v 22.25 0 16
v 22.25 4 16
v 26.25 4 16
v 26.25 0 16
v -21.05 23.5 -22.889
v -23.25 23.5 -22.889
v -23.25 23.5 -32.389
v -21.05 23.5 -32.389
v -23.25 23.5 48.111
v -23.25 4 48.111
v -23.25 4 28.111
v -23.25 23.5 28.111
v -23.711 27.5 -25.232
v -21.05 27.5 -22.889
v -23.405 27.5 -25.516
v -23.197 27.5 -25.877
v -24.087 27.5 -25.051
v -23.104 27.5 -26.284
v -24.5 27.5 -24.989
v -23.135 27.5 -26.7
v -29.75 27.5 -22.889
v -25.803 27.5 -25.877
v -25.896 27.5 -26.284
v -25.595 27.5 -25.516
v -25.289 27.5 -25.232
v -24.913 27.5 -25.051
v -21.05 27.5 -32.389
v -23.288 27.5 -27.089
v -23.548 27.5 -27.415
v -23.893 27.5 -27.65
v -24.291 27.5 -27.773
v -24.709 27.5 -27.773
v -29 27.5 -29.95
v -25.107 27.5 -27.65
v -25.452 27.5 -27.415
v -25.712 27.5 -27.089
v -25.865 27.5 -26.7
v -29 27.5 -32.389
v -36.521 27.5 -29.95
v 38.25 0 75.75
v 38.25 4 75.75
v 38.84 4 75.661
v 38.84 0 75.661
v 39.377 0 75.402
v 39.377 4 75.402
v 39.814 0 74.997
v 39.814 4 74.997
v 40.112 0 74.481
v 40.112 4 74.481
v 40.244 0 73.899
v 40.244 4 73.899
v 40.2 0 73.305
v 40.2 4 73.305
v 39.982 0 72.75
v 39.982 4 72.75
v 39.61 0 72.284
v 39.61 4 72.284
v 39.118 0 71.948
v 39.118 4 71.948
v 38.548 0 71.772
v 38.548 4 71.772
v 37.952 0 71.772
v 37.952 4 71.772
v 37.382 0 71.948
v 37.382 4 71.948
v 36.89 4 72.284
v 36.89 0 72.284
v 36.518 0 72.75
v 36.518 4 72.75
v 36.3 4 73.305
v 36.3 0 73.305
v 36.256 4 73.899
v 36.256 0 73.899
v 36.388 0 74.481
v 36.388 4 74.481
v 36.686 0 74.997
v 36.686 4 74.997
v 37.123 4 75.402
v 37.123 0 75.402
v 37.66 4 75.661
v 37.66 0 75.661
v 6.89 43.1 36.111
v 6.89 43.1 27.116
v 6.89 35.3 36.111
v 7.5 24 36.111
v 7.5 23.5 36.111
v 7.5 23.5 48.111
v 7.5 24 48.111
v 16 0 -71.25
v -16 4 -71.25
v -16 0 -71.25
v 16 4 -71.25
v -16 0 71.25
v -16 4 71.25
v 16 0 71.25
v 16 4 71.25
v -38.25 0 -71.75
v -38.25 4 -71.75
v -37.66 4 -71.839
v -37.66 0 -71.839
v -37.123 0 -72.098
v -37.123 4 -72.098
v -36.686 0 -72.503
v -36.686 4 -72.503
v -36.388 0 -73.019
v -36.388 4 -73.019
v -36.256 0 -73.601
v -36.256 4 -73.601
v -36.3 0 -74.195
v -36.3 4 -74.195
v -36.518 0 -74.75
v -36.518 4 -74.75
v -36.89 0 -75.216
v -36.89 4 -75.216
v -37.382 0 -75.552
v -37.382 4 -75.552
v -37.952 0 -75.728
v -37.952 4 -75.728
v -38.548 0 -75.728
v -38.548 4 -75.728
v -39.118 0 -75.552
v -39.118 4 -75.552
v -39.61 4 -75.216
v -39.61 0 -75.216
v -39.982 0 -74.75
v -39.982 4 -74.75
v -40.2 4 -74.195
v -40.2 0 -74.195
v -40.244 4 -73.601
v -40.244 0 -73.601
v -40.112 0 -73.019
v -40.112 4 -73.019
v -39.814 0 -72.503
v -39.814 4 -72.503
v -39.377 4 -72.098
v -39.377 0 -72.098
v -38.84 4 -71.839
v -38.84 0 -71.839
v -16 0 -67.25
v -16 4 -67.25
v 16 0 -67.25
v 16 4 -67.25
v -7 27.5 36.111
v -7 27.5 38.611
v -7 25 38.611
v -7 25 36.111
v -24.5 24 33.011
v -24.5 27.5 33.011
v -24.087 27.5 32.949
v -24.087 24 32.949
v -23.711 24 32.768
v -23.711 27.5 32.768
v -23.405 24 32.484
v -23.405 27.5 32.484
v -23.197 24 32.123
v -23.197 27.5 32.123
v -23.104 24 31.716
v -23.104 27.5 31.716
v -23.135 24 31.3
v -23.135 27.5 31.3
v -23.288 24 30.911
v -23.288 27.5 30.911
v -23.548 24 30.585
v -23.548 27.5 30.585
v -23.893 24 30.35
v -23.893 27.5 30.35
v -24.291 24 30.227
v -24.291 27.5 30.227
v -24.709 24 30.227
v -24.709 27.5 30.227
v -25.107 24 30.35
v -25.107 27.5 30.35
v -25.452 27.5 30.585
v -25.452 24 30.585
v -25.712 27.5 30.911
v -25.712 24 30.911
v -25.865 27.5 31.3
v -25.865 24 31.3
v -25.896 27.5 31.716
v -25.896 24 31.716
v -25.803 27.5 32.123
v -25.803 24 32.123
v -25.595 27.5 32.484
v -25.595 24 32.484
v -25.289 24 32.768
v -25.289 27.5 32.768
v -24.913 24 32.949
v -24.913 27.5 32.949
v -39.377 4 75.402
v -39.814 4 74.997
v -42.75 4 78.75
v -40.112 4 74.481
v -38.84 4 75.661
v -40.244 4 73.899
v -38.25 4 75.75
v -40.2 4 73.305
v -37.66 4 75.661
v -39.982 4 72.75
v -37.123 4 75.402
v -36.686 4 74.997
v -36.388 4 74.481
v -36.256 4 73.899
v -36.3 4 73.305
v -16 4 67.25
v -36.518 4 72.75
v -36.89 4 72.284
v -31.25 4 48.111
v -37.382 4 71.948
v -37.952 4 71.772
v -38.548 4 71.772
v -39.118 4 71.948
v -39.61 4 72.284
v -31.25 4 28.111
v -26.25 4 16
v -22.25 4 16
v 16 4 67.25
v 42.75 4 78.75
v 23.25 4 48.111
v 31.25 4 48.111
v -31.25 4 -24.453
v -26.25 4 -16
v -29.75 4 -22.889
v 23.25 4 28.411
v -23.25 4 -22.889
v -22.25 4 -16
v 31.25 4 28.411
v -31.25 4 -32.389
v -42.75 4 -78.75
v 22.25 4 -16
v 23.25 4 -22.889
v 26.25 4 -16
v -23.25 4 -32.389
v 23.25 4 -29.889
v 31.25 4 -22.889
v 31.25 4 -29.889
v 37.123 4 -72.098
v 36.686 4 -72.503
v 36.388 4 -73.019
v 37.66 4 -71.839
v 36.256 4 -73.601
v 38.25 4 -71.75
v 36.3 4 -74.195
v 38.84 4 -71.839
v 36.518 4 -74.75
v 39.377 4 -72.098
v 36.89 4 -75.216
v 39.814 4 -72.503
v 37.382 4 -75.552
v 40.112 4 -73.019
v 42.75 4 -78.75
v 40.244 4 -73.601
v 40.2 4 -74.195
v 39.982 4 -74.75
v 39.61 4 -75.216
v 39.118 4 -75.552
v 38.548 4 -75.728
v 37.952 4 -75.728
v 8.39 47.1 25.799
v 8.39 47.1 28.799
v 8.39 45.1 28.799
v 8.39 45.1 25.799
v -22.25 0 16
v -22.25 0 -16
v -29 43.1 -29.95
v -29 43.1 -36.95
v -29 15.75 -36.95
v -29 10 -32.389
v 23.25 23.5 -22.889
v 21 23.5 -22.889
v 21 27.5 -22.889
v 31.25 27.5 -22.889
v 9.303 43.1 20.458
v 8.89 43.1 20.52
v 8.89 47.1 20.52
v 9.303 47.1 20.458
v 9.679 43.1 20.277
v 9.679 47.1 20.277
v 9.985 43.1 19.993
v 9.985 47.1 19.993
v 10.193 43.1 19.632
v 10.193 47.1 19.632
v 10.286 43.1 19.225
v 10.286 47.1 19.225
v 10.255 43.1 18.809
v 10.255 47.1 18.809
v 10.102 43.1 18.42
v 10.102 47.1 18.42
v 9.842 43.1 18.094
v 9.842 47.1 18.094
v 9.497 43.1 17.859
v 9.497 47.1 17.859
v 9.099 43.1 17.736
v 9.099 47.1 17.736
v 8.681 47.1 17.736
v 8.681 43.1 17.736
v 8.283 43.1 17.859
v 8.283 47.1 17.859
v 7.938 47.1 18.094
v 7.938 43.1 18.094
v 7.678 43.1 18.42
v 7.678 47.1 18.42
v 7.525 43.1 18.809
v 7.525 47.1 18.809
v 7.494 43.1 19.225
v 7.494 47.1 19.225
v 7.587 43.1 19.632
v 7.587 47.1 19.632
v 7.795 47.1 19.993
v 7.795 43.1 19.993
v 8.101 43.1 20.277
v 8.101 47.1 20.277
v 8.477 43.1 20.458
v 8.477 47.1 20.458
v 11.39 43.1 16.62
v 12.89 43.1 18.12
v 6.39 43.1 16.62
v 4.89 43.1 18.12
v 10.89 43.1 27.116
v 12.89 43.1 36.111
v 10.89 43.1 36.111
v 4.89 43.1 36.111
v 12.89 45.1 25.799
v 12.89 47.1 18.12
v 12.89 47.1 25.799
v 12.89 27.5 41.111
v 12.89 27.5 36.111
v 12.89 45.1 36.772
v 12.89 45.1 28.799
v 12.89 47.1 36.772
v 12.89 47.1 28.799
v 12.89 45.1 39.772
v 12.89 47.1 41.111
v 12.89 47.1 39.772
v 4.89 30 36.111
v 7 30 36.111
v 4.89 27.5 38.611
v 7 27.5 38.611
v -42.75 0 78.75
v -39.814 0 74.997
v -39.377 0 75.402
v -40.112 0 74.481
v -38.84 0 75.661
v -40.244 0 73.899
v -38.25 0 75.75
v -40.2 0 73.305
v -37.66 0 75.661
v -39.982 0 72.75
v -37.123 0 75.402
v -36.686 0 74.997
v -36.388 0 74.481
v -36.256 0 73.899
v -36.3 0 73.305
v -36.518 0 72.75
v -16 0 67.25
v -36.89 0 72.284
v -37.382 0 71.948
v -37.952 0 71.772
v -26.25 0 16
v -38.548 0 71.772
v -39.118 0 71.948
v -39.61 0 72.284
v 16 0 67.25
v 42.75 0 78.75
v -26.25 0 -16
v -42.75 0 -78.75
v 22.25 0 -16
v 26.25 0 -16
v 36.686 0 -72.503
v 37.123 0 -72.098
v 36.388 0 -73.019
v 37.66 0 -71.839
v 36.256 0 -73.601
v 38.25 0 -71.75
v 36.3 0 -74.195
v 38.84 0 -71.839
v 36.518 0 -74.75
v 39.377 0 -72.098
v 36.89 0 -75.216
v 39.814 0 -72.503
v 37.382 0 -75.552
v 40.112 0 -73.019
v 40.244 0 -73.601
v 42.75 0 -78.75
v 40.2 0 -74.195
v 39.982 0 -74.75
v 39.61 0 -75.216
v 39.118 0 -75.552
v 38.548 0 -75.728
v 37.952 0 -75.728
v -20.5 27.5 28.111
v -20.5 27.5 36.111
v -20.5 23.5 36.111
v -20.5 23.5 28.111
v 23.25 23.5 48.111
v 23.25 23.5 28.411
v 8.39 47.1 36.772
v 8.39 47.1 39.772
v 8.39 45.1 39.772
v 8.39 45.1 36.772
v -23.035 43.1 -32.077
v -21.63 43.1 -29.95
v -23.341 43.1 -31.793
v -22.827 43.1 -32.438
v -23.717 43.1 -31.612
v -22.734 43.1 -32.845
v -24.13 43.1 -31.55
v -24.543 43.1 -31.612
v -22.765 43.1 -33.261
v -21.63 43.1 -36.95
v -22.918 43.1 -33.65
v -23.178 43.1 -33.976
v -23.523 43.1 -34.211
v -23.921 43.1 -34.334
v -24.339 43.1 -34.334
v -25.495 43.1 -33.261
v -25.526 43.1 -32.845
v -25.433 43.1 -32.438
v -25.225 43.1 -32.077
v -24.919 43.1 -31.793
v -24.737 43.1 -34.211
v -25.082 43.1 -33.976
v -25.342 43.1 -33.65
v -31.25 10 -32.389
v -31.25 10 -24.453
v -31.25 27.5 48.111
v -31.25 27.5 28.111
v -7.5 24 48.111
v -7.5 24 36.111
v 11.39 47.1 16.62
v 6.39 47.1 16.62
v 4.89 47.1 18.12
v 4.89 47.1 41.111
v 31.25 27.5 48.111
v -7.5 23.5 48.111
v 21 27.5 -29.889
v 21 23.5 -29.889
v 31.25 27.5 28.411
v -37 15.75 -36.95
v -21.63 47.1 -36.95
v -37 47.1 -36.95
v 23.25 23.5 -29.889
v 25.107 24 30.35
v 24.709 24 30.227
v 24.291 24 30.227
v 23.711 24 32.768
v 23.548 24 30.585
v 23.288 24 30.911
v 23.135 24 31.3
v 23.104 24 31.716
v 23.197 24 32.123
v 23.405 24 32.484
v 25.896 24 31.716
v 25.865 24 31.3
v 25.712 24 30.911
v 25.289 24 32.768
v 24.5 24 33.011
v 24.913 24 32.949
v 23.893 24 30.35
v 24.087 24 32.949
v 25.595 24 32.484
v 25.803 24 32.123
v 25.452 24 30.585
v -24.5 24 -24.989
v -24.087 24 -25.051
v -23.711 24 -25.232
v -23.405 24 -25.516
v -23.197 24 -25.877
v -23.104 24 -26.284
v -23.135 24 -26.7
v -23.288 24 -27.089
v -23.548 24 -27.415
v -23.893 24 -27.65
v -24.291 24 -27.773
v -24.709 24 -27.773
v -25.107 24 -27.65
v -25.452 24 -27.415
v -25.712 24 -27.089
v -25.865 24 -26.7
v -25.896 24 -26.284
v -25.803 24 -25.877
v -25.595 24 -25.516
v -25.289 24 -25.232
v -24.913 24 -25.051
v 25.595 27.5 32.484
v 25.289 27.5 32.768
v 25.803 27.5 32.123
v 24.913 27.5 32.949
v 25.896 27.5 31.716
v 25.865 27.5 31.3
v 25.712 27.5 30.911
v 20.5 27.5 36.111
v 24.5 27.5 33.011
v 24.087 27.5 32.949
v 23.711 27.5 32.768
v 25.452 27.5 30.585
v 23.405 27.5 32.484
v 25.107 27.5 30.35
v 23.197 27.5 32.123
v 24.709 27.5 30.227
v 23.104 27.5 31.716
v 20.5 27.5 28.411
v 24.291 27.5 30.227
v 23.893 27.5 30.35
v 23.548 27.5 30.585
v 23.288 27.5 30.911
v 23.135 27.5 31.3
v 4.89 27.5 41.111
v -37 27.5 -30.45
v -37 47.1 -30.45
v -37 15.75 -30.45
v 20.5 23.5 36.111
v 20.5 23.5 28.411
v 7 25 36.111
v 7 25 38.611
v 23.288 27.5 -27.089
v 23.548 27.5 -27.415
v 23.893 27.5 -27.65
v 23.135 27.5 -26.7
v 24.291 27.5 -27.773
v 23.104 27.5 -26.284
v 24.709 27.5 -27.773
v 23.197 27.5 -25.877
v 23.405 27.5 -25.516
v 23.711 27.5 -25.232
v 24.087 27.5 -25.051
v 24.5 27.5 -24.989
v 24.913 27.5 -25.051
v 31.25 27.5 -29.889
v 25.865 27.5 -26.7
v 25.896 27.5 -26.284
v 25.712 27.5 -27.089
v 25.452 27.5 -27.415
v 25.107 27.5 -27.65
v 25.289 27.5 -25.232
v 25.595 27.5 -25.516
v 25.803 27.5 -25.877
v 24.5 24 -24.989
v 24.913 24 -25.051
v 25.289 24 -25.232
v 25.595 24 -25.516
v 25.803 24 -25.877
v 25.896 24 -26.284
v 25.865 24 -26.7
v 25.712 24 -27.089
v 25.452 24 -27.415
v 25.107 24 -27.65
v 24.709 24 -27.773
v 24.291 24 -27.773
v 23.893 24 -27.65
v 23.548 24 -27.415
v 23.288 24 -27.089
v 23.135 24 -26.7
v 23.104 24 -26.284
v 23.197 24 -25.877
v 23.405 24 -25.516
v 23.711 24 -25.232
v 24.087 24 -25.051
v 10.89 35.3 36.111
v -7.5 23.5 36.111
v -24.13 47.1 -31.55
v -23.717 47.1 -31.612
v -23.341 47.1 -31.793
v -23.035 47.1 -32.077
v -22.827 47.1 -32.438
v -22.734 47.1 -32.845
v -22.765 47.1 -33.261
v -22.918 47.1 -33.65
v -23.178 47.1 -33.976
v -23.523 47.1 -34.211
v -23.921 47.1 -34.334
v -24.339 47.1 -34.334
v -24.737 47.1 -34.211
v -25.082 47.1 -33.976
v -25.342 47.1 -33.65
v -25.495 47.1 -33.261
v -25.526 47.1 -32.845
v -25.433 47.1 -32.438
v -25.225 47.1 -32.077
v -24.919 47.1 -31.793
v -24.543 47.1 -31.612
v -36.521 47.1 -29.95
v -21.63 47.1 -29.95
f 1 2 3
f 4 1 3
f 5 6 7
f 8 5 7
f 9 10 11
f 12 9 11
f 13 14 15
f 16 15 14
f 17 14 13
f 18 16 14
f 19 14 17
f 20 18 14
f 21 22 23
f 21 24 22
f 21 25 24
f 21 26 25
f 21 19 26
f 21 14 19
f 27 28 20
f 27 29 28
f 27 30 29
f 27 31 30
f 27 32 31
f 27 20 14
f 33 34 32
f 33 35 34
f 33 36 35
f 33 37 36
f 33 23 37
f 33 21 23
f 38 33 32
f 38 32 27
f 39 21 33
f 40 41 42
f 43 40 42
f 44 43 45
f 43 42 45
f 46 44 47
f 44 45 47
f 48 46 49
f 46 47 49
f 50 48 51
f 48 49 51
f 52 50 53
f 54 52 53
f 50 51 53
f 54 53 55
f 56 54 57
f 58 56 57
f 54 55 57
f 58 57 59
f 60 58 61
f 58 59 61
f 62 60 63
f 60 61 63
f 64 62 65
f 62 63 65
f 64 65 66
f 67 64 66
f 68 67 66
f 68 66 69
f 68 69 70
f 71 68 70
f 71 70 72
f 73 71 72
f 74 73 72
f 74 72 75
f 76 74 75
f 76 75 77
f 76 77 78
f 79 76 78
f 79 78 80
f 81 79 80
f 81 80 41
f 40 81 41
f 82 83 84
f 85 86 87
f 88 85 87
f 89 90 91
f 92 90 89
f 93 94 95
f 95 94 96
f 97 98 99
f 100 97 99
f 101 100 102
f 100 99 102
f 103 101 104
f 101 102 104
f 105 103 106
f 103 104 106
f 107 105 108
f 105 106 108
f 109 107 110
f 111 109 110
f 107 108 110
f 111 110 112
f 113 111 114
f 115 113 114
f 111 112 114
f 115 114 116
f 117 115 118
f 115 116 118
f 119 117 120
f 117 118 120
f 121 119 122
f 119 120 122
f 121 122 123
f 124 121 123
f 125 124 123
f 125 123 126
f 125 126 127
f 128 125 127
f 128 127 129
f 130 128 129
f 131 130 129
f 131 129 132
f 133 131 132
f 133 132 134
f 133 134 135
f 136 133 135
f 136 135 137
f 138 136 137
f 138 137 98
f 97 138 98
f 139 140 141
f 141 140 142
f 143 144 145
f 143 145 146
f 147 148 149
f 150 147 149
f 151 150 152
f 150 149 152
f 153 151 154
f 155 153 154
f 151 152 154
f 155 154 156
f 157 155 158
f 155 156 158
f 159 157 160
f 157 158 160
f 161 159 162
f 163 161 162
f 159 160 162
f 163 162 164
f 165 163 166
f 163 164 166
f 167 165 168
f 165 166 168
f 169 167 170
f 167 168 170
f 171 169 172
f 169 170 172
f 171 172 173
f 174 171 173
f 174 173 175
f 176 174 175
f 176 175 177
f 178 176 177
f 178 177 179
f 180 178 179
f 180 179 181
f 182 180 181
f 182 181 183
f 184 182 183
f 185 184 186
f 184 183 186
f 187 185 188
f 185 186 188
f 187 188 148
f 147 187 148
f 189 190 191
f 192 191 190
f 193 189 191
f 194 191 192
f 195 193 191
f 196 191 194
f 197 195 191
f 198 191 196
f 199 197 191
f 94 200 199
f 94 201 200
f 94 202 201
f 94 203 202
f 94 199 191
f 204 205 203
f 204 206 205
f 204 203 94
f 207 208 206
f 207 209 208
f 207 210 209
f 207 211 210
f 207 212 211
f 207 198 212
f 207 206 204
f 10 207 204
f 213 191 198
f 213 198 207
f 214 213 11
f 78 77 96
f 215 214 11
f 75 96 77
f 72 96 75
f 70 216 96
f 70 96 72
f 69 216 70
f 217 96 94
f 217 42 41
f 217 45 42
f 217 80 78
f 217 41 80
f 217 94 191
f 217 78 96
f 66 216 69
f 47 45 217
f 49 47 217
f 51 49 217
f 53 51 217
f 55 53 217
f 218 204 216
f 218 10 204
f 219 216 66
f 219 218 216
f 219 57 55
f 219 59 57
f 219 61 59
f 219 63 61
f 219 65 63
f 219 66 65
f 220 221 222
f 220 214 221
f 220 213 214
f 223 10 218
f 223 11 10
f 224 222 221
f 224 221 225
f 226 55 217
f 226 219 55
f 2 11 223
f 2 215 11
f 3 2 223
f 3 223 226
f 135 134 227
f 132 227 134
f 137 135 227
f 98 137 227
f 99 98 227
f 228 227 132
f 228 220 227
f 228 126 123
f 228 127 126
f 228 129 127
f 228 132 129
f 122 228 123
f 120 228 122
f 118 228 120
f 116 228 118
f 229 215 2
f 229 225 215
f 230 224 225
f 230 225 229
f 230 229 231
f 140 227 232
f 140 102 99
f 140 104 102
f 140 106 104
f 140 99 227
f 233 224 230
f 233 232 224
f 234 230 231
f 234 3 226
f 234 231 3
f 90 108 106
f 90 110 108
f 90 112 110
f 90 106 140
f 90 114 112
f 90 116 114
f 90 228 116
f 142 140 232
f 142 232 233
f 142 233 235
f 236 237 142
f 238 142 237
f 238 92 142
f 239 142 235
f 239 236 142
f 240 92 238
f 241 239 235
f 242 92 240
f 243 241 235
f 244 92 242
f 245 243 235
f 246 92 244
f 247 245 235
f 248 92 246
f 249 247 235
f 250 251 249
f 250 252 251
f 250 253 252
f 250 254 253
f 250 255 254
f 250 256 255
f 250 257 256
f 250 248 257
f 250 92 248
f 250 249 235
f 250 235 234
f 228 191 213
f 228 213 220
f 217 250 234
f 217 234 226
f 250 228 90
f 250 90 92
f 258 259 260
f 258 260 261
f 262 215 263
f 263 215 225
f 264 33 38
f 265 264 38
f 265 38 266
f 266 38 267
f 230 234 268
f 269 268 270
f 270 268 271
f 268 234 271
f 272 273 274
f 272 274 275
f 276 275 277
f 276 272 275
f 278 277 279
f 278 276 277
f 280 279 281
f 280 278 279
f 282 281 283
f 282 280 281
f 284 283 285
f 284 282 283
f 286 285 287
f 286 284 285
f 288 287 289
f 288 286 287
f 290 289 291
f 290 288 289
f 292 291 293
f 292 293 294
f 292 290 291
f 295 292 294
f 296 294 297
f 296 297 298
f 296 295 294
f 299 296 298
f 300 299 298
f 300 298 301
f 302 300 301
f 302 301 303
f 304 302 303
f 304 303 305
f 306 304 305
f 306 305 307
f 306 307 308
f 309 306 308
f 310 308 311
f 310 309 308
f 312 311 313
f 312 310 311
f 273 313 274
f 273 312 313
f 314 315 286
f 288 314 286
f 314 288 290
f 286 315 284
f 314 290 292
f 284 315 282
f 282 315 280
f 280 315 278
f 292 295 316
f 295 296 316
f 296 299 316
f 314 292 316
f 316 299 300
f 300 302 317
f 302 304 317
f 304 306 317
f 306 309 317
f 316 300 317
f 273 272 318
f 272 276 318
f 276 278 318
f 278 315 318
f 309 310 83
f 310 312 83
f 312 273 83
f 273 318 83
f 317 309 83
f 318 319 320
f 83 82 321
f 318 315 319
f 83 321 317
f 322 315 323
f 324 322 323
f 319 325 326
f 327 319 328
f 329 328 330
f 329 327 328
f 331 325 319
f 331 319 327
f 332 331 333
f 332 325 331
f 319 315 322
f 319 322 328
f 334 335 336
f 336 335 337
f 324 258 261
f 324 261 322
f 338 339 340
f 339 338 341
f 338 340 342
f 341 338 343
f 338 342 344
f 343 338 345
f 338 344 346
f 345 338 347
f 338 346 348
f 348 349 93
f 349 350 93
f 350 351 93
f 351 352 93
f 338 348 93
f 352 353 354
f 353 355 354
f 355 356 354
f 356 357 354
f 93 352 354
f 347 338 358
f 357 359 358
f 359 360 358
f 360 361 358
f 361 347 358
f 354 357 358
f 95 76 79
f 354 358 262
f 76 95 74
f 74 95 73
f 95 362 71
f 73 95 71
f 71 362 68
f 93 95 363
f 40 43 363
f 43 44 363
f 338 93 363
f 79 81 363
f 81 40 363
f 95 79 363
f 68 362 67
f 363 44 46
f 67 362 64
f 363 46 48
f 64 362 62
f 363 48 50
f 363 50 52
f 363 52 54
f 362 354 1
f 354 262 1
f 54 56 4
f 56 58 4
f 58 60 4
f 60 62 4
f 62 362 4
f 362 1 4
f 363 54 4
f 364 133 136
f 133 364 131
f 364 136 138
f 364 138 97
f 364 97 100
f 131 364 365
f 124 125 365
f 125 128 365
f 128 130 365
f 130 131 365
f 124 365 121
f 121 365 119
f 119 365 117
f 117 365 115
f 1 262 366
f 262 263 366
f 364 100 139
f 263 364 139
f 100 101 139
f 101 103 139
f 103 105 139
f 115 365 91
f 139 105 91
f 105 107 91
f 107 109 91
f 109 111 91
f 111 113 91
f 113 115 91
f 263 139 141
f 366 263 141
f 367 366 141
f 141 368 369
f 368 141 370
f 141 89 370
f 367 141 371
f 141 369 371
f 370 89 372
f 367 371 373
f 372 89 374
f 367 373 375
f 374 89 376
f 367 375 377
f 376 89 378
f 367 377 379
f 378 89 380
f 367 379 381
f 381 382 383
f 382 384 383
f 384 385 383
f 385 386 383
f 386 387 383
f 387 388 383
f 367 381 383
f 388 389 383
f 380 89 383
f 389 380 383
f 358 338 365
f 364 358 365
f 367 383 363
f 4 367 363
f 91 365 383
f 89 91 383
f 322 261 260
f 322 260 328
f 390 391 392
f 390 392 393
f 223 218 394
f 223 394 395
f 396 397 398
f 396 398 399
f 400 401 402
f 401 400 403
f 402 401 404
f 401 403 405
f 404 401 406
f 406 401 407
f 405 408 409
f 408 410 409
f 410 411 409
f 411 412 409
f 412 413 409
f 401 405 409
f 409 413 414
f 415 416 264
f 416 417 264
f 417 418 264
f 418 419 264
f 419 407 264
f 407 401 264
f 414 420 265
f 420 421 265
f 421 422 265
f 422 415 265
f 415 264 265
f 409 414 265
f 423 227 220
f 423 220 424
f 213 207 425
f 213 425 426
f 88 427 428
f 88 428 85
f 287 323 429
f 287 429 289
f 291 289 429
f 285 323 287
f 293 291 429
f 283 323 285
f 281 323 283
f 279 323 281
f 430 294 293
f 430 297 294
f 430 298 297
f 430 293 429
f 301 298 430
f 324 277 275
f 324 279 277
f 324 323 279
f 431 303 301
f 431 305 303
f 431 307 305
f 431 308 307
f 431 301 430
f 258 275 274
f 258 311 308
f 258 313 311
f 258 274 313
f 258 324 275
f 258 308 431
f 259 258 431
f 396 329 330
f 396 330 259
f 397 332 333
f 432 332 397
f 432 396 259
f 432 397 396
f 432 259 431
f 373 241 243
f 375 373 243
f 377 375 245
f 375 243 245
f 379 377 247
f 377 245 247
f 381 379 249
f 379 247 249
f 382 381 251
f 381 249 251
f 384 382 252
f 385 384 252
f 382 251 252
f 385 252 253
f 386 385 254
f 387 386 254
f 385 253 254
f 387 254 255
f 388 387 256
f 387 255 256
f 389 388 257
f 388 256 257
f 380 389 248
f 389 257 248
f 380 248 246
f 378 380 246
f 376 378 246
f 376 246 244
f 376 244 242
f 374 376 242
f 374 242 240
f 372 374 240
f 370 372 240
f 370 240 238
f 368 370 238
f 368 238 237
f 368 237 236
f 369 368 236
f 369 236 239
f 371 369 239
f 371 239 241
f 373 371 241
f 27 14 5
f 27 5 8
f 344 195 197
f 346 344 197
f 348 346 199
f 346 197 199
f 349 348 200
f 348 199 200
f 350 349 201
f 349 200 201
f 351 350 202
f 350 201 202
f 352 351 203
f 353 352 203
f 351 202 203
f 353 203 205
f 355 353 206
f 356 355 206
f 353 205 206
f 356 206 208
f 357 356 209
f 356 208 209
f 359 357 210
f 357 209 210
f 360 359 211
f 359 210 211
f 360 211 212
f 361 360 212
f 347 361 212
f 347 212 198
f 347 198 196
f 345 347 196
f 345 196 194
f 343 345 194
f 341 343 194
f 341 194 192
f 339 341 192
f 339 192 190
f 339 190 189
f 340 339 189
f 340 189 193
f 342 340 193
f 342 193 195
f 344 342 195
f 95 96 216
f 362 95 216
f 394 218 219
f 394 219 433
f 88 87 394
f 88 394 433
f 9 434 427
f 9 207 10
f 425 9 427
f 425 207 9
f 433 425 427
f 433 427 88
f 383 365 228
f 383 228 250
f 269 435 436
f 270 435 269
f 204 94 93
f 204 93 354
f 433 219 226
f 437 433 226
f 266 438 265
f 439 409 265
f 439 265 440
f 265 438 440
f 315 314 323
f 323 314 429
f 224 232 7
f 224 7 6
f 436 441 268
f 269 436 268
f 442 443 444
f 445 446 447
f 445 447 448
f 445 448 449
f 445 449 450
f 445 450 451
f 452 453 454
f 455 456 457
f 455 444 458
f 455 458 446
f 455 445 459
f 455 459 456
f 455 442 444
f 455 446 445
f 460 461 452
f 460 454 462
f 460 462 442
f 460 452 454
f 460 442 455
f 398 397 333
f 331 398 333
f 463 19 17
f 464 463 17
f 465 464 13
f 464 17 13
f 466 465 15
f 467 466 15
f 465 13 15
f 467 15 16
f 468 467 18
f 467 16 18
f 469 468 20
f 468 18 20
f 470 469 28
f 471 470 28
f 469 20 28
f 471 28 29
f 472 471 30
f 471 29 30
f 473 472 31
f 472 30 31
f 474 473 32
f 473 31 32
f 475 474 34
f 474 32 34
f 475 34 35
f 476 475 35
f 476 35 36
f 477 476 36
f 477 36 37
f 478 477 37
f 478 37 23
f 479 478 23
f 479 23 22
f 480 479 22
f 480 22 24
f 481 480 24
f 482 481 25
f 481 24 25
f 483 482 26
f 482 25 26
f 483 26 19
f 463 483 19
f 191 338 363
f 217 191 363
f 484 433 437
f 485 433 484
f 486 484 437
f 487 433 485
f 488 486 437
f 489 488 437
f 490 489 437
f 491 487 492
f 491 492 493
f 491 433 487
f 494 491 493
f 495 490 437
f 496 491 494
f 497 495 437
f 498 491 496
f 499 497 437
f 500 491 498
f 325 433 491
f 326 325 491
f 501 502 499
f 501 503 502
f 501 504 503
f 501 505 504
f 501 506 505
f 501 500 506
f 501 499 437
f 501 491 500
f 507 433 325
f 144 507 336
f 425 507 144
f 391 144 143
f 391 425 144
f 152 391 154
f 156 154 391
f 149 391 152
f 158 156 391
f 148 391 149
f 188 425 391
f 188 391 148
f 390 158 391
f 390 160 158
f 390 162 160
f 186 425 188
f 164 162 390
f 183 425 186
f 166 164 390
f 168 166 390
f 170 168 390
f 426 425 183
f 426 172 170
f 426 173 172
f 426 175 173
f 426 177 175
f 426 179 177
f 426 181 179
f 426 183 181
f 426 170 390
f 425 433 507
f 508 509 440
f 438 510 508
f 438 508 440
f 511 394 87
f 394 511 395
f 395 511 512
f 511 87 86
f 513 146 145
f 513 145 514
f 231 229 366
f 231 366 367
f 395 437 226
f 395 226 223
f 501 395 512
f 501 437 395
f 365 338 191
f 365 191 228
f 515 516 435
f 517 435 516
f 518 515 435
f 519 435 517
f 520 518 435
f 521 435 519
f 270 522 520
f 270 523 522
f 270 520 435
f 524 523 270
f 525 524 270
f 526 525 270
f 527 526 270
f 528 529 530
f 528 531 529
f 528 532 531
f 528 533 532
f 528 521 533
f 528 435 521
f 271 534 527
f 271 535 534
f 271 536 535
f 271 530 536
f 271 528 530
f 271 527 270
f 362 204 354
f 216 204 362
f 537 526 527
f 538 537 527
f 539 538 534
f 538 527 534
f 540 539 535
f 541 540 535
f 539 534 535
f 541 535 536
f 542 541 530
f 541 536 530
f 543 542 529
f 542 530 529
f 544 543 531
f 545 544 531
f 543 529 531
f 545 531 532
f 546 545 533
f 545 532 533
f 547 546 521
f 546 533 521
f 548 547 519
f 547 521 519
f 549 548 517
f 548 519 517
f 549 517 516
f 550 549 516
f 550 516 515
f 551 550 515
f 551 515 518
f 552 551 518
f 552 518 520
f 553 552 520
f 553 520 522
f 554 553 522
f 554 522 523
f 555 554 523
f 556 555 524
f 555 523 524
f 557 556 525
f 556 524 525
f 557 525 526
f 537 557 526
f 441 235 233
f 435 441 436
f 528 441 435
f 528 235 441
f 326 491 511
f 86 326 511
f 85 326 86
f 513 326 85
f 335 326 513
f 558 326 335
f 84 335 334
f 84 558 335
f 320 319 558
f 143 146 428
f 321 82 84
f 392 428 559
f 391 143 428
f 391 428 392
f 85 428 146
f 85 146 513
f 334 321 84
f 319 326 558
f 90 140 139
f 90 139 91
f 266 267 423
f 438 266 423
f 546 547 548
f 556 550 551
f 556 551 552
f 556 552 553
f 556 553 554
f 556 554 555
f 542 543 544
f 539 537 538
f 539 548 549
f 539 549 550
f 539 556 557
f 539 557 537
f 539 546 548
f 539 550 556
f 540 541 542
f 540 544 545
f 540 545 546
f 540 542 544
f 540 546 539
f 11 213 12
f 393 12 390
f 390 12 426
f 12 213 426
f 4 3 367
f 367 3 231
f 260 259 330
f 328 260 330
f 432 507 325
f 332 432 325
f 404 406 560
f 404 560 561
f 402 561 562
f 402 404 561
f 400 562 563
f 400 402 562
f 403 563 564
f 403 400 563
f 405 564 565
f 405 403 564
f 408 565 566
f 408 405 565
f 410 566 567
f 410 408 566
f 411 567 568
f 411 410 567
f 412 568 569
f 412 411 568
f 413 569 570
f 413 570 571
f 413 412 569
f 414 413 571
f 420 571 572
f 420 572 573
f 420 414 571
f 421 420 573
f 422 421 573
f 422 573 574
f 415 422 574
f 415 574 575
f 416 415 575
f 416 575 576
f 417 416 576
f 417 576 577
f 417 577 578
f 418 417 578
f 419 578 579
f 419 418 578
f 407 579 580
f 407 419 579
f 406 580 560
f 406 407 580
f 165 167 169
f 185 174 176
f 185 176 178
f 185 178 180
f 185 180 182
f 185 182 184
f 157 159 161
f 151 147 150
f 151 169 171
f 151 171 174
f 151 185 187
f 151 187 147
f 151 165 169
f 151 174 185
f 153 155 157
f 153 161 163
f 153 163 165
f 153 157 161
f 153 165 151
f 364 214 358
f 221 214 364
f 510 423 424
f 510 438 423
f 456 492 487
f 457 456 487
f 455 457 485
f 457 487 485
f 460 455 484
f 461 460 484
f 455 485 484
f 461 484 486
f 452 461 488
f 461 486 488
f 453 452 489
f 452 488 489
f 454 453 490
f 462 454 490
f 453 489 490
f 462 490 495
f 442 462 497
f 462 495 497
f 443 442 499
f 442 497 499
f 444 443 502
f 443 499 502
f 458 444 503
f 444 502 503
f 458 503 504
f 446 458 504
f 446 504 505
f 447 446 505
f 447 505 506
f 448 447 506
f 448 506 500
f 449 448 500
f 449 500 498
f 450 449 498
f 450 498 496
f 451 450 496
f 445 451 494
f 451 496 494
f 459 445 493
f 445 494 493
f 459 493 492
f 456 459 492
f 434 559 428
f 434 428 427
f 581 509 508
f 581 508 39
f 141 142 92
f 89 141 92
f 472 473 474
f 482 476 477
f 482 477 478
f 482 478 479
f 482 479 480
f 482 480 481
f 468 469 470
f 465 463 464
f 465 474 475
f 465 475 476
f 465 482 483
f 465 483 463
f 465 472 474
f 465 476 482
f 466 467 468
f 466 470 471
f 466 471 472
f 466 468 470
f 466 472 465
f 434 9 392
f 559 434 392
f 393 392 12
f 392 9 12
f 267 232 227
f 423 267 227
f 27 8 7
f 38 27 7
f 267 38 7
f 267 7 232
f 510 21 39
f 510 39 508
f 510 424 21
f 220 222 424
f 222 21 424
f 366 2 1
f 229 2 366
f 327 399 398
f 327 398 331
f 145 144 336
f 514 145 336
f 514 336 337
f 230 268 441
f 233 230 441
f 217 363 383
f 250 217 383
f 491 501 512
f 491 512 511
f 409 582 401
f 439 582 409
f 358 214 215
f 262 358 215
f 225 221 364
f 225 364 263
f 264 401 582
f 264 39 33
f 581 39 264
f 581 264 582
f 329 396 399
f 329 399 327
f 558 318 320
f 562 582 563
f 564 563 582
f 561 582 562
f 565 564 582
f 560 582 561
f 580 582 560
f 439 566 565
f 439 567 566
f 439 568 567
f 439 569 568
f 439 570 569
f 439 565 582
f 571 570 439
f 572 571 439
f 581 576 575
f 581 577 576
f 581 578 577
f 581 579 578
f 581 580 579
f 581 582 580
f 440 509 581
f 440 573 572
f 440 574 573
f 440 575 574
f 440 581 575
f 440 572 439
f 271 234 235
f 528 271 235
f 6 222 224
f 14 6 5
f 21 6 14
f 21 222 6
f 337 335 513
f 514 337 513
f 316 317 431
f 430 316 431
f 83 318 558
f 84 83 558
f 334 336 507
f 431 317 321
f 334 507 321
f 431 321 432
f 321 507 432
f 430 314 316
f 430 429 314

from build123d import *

# Parameters (mm, degrees)
SKETCH1_W                 = 85.5
SKETCH1_H                 = 157.5
BOSS_EXTRUDE1_DEPTH       = 4
CUT_EXTRUDE1_REACH        = 91.695
SKETCH2_R                 = 2
CUT_EXTRUDE3_REACH        = 91.695
SKETCH5_W                 = 4
SKETCH5_H                 = 32
SKETCH5_W_2               = 32
SKETCH5_H_2               = 4
SKETCH5_3_W               = 8
SKETCH5_3_H               = 7
SKETCH5_3_H_2             = 20
SKETCH5_3_H_3             = 19.7
BOSS_EXTRUDE3_DEPTH       = 23.5
SKETCH6_W                 = 20
SKETCH6_H                 = 4
BOSS_EXTRUDE5_DEPTH       = 46.5
CUT_EXTRUDE4_REACH        = 95.73
SKETCH8_W                 = 7
SKETCH8_H                 = 4
BOSS_EXTRUDE6_DEPTH       = 2.25
SKETCH9_W                 = 9.5
SKETCH9_H                 = 4
BOSS_EXTRUDE7_DEPTH       = 2.2
CUT_EXTRUDE5_START        = 23.5
SKETCH5_5_R               = 1.4
CUT_EXTRUDE5_DEPTH        = 3.5
SKETCH13_W                = 8
SKETCH13_H                = 7
SKETCH13_H_2              = 5
BOSS_EXTRUDE8_DEPTH       = 19.6
CUT_EXTRUDE11_REACH       = 95.73
SKETCH14_W                = 7
SKETCH14_H                = 4
BOSS_EXTRUDE9_DEPTH       = 7.37
SKETCH15_W                = 8
SKETCH15_H                = 4
BOSS_EXTRUDE10_DEPTH      = 19.49132
CUT_EXTRUDE6_START        = 39.1
SKETCH5_6_R               = 1.4
CUT_EXTRUDE6_DEPTH        = 4
SKETCH16_W                = 4.5
SKETCH16_H                = 3
CUT_EXTRUDE7_DEPTH        = 2
CHAMFER1_SIZE             = 1.5
BOSS_EXTRUDE11_DEPTH      = 2
BOSS_EXTRUDE11_DEPTH_BACK = 2
CUT_EXTRUDE8_REACH        = 134.032
SKETCH20_W                = 5.75
SKETCH20_H                = 6
CHAMFER2_SIZE             = 5.75
SKETCH21_W                = 2.25
SKETCH21_H                = 6
CUT_EXTRUDE9_DEPTH        = 4.56132
CHAMFER3_SIZE             = 5.75
CHAMFER3_SIZE2            = 4.56132
SKETCH22_W                = 14
SKETCH22_H                = 2.5
CUT_EXTRUDE10_DEPTH       = 2.5
CHAMFER4_SIZE             = 2.5
SKETCH24_W                = 15
SKETCH24_H                = 12
CUT_EXTRUDE12_DEPTH       = 0.5


# Some blends are built 0.0001 mm under size
with BuildPart() as part:
    # Sketch1 → Boss-Extrude1 (new body)
    with BuildSketch(Plane(origin=(0, 0, 0), x_dir=(1, 0, 0), z_dir=(0, 1, 0))):
        Rectangle(SKETCH1_W, SKETCH1_H)
    extrude(amount=BOSS_EXTRUDE1_DEPTH)

    # Sketch2 → Cut-Extrude1 (cut, up to next)
    with BuildSketch(Plane(origin=(0, 4, 0), x_dir=(1, 0, 0), z_dir=(0, 1, 0)), mode=Mode.PRIVATE) as cut_extrude1_sk1:
        with Locations(Location((38.25, -73.75, 0), (0, 0, 270))):
            Circle(SKETCH2_R)
    cut_extrude1_tool1 = extrude(cut_extrude1_sk1.sketch, amount=-CUT_EXTRUDE1_REACH, mode=Mode.PRIVATE) & part.part
    # Sketch2 → Cut-Extrude1 (cut, up to next)
    with BuildSketch(Plane(origin=(0, 4, 0), x_dir=(1, 0, 0), z_dir=(0, 1, 0)), mode=Mode.PRIVATE) as cut_extrude1_sk2:
        with Locations(Location((38.25, 73.75, 0), (0, 0, 270))):
            Circle(SKETCH2_R)
    cut_extrude1_tool2 = extrude(cut_extrude1_sk2.sketch, amount=-CUT_EXTRUDE1_REACH, mode=Mode.PRIVATE) & part.part
    # Sketch2 → Cut-Extrude1 (cut, up to next)
    with BuildSketch(Plane(origin=(0, 4, 0), x_dir=(1, 0, 0), z_dir=(0, 1, 0)), mode=Mode.PRIVATE) as cut_extrude1_sk3:
        with Locations(Location((-38.25, -73.75, 0), (0, 0, 270))):
            Circle(SKETCH2_R)
    cut_extrude1_tool3 = extrude(cut_extrude1_sk3.sketch, amount=-CUT_EXTRUDE1_REACH, mode=Mode.PRIVATE) & part.part
    # Sketch2 → Cut-Extrude1 (cut, up to next)
    with BuildSketch(Plane(origin=(0, 4, 0), x_dir=(1, 0, 0), z_dir=(0, 1, 0)), mode=Mode.PRIVATE) as cut_extrude1_sk4:
        with Locations(Location((-38.25, 73.75, 0), (0, 0, 270))):
            Circle(SKETCH2_R)
    cut_extrude1_tool4 = extrude(cut_extrude1_sk4.sketch, amount=-CUT_EXTRUDE1_REACH, mode=Mode.PRIVATE) & part.part
    add(cut_extrude1_tool1.solids().sort_by_distance((38.25, 4, 73.75))[0], mode=Mode.SUBTRACT)
    add(cut_extrude1_tool2.solids().sort_by_distance((38.25, 4, -73.75))[0], mode=Mode.SUBTRACT)
    add(cut_extrude1_tool3.solids().sort_by_distance((-38.25, 4, 73.75))[0], mode=Mode.SUBTRACT)
    add(cut_extrude1_tool4.solids().sort_by_distance((-38.25, 4, -73.75))[0], mode=Mode.SUBTRACT)

    # Sketch5 → Cut-Extrude3 (cut, up to next)
    with BuildSketch(Plane(origin=(0, 4, 0), x_dir=(1, 0, 0), z_dir=(0, 1, 0)), mode=Mode.PRIVATE) as cut_extrude3_sk1:
        with Locations((-24.25, 0)):
            Rectangle(SKETCH5_W, SKETCH5_H)
    cut_extrude3_tool1 = extrude(cut_extrude3_sk1.sketch, amount=-CUT_EXTRUDE3_REACH, mode=Mode.PRIVATE) & part.part
    # Sketch5 → Cut-Extrude3 (cut, up to next)
    with BuildSketch(Plane(origin=(0, 4, 0), x_dir=(1, 0, 0), z_dir=(0, 1, 0)), mode=Mode.PRIVATE) as cut_extrude3_sk2:
        with Locations((0, 69.25)):
            Rectangle(SKETCH5_W_2, SKETCH5_H_2)
    cut_extrude3_tool2 = extrude(cut_extrude3_sk2.sketch, amount=-CUT_EXTRUDE3_REACH, mode=Mode.PRIVATE) & part.part
    # Sketch5 → Cut-Extrude3 (cut, up to next)
    with BuildSketch(Plane(origin=(0, 4, 0), x_dir=(1, 0, 0), z_dir=(0, 1, 0)), mode=Mode.PRIVATE) as cut_extrude3_sk3:
        with Locations((0, -69.25)):
            Rectangle(SKETCH5_W_2, SKETCH5_H_2)
    cut_extrude3_tool3 = extrude(cut_extrude3_sk3.sketch, amount=-CUT_EXTRUDE3_REACH, mode=Mode.PRIVATE) & part.part
    # Sketch5 → Cut-Extrude3 (cut, up to next)
    with BuildSketch(Plane(origin=(0, 4, 0), x_dir=(1, 0, 0), z_dir=(0, 1, 0)), mode=Mode.PRIVATE) as cut_extrude3_sk4:
        with Locations((24.25, 0)):
            Rectangle(SKETCH5_W, SKETCH5_H)
    cut_extrude3_tool4 = extrude(cut_extrude3_sk4.sketch, amount=-CUT_EXTRUDE3_REACH, mode=Mode.PRIVATE) & part.part
    add(cut_extrude3_tool1.solids().sort_by_distance((-24.25, 4, 0))[0], mode=Mode.SUBTRACT)
    add(cut_extrude3_tool2.solids().sort_by_distance((0, 4, -69.25))[0], mode=Mode.SUBTRACT)
    add(cut_extrude3_tool3.solids().sort_by_distance((0, 4, 69.25))[0], mode=Mode.SUBTRACT)
    add(cut_extrude3_tool4.solids().sort_by_distance((24.25, 4, 0))[0], mode=Mode.SUBTRACT)

    # Sketch5<3> → Boss-Extrude3 (add)
    with BuildSketch(Plane(origin=(0, 4, 0), x_dir=(1, 0, 0), z_dir=(0, 1, 0))):
        Polygon((-37, 36.94993), (-29, 36.94993), (-29, 32.38861), (-23.25, 32.38861), (-23.25, 22.88861), (-29.75, 22.88861), (-37, 30.44993), align=None)
        with Locations((27.25, 26.38861)):
            Rectangle(SKETCH5_3_W, SKETCH5_3_H)
        with Locations((-27.25, -38.11139)):
            Rectangle(SKETCH5_3_W, SKETCH5_3_H_2)
        with Locations((27.25, -38.26139)):
            Rectangle(SKETCH5_3_W, SKETCH5_3_H_3)
    extrude(amount=BOSS_EXTRUDE3_DEPTH)

    # Sketch6 → Boss-Extrude5 (add)
    with BuildSketch(Plane(origin=(-23.25, 0, 0), x_dir=(0, 0, -1), z_dir=(1, 0, 0))):
        with Locations((-38.11139, 25.5)):
            Rectangle(SKETCH6_W, SKETCH6_H)
    extrude(amount=BOSS_EXTRUDE5_DEPTH)

    # Sketch7 → Cut-Extrude4 (cut, up to next)
    with BuildSketch(Plane(origin=(0, 27.5, 0), x_dir=(1, 0, 0), z_dir=(0, 1, 0)), mode=Mode.PRIVATE) as cut_extrude4_sk1:
        Polygon((-20.5, -28.11139), (23.25, -28.11139), (23.25, -28.41139), (20.5, -28.41139), (20.5, -36.11139), (-20.5, -36.11139), align=None)
    cut_extrude4_tool1 = extrude(cut_extrude4_sk1.sketch, amount=-CUT_EXTRUDE4_REACH, mode=Mode.PRIVATE) & part.part
    add(cut_extrude4_tool1.solids().sort_by_distance((0.054883, 27.5, 32.101731))[0], mode=Mode.SUBTRACT)

    # Sketch8 → Boss-Extrude6 (add)
    with BuildSketch(Plane.ZY.offset(-23.25)):
        with Locations((-26.38861, 25.5)):
            Rectangle(SKETCH8_W, SKETCH8_H)
    extrude(amount=BOSS_EXTRUDE6_DEPTH)

    # Sketch9 → Boss-Extrude7 (add)
    with BuildSketch(Plane(origin=(-23.25, 0, 0), x_dir=(0, 0, -1), z_dir=(1, 0, 0))):
        with Locations((27.63861, 25.5)):
            Rectangle(SKETCH9_W, SKETCH9_H)
    extrude(amount=BOSS_EXTRUDE7_DEPTH)

    # Sketch5<5> → Cut-Extrude5 (cut)
    with BuildSketch(Plane(origin=(0, 4, 0), x_dir=(1, 0, 0), z_dir=(0, 1, 0)).offset(CUT_EXTRUDE5_START)):
        with Locations(Location((-24.5, 26.38861, 0), (0, 0, 270))):
            Circle(SKETCH5_5_R)
        with Locations(Location((24.5, -31.61139, 0), (0, 0, 270))):
            Circle(SKETCH5_5_R)
        with Locations(Location((24.5, 26.38861, 0), (0, 0, 270))):
            Circle(SKETCH5_5_R)
        with Locations(Location((-24.5, -31.61139, 0), (0, 0, 270))):
            Circle(SKETCH5_5_R)
    extrude(amount=-CUT_EXTRUDE5_DEPTH, mode=Mode.SUBTRACT)

    # Sketch13 → Boss-Extrude8 (add)
    with BuildSketch(Plane(origin=(0, 27.5, 0), x_dir=(1, 0, 0), z_dir=(0, 1, 0))):
        with Locations((-33, 33.44993)):
            Rectangle(SKETCH13_W, SKETCH13_H)
        with Locations((8.89, -38.61139)):
            Rectangle(SKETCH13_W, SKETCH13_H_2)
    extrude(amount=BOSS_EXTRUDE8_DEPTH)

    # Sketch23 → Cut-Extrude11 (cut, up to next)
    with BuildSketch(Plane.XZ.offset(-27.5), mode=Mode.PRIVATE) as cut_extrude11_sk1:
        Polygon((-37, -29.94993), (-37, -30.44993), (-36.520586353, -29.94993), align=None)
    cut_extrude11_tool1 = extrude(cut_extrude11_sk1.sketch, amount=-CUT_EXTRUDE11_REACH, mode=Mode.PRIVATE) & part.part
    add(cut_extrude11_tool1.solids().sort_by_distance((-36.840195, 27.5, -30.116597))[0], mode=Mode.SUBTRACT)

    # Sketch14 → Boss-Extrude9 (add)
    with BuildSketch(Plane(origin=(-29, 0, 0), x_dir=(0, 0, -1), z_dir=(1, 0, 0))):
        with Locations((33.44993, 45.1)):
            Rectangle(SKETCH14_W, SKETCH14_H)
    extrude(amount=BOSS_EXTRUDE9_DEPTH)

    # Sketch15 → Boss-Extrude10 (add)
    with BuildSketch(Plane(origin=(0, 0, 36.11139), x_dir=(-1, 0, 0), z_dir=(0, 0, -1))):
        with Locations((-8.89, 45.1)):
            Rectangle(SKETCH15_W, SKETCH15_H)
    extrude(amount=BOSS_EXTRUDE10_DEPTH)

    # Sketch5<6> → Cut-Extrude6 (cut)
    with BuildSketch(Plane(origin=(0, 4, 0), x_dir=(1, 0, 0), z_dir=(0, 1, 0)).offset(CUT_EXTRUDE6_START)):
        with Locations(Location((-24.13, 32.94993, 0), (0, 0, 270))):
            Circle(SKETCH5_6_R)
        with Locations(Location((8.89, -19.12007, 0), (0, 0, 270))):
            Circle(SKETCH5_6_R)
    extrude(amount=CUT_EXTRUDE6_DEPTH, mode=Mode.SUBTRACT)

    # Sketch16 → Cut-Extrude7 (cut)
    with BuildSketch(Plane(origin=(0, 47.1, 0), x_dir=(1, 0, 0), z_dir=(0, 1, 0))):
        with Locations((10.64, -27.29907)):
            Rectangle(SKETCH16_W, SKETCH16_H)
        with Locations((10.64, -38.27207)):
            Rectangle(SKETCH16_W, SKETCH16_H)
    extrude(amount=-CUT_EXTRUDE7_DEPTH, mode=Mode.SUBTRACT)

    # Chamfer1
    chamfer1_edges = [part.edges().sort_by_distance(p)[0] for p in [
        (12.89, 45.1, 16.62007),
        (4.89, 45.1, 16.62007),
    ]]
    chamfer(chamfer1_edges, length=CHAMFER1_SIZE)

    # Sketch19 → Boss-Extrude11 (add, two sides: drawn at the far end of the back side and taken through both)
    with BuildSketch(Plane.ZY.offset(-8.89).offset(-BOSS_EXTRUDE11_DEPTH_BACK)):
        Polygon((27.11573, 43.1), (36.11139, 35.3), (36.11139, 43.1), align=None)
    extrude(amount=BOSS_EXTRUDE11_DEPTH + BOSS_EXTRUDE11_DEPTH_BACK)

    # Cut-Extrude8: up to this plane
    cut_extrude8_end = Plane(origin=(-4.065843585, 27.5, 3.898441805), z_dir=(0.7218100693808475, 0, -0.6920911961153792))
    # Sketch20 → Cut-Extrude8 (cut, up to the surface)
    with BuildSketch(Plane(origin=(0, 0, -36.94993), x_dir=(-1, 0, 0), z_dir=(0, 0, -1)), mode=Mode.PRIVATE) as cut_extrude8_sk1:
        with Locations((34.125, 7)):
            Rectangle(SKETCH20_W, SKETCH20_H)
    cut_extrude8_tool1 = split(extrude(cut_extrude8_sk1.sketch, amount=-CUT_EXTRUDE8_REACH, mode=Mode.PRIVATE), bisect_by=cut_extrude8_end, keep=Keep.BOTH, mode=Mode.PRIVATE)
    add(cut_extrude8_tool1.solids().sort_by_distance((-34.125, 7, -36.94993))[0], mode=Mode.SUBTRACT)

    # Chamfer2
    chamfer2_edges = [part.edges().sort_by_distance(p)[0] for p in [
        (-37, 10, -33.69993),
    ]]
    chamfer(chamfer2_edges, length=CHAMFER2_SIZE - 0.0001)  # a hair under: the kernel refuses the full size

    # Sketch21 → Cut-Extrude9 (cut)
    with BuildSketch(Plane(origin=(0, 0, -36.94993), x_dir=(-1, 0, 0), z_dir=(0, 0, -1))):
        with Locations((30.125, 7)):
            Rectangle(SKETCH21_W, SKETCH21_H)
    extrude(amount=-CUT_EXTRUDE9_DEPTH, mode=Mode.SUBTRACT)

    # Chamfer3
    chamfer3_edges = [part.edges().sort_by_distance(p)[0] for p in [
        (-30.125, 10, -36.94993),
    ]]
    chamfer3_side = [part.faces().sort_by_distance(p)[0] for p in [
        (-32.15740492, 31.012813369, -36.94993),
    ]]
    chamfer(chamfer3_edges, length=CHAMFER3_SIZE, length2=CHAMFER3_SIZE2, reference=chamfer3_side[0])

    # Sketch22 → Cut-Extrude10 (cut)
    with BuildSketch(Plane(origin=(0, 27.5, 0), x_dir=(1, 0, 0), z_dir=(0, 1, 0))):
        with Locations((0, -37.36139)):
            Rectangle(SKETCH22_W, SKETCH22_H)
    extrude(amount=-CUT_EXTRUDE10_DEPTH, mode=Mode.SUBTRACT)

    # Chamfer4
    # the kernel refuses this chamfer: 2.5 mm, written as the material it takes off along each edge
    with BuildSketch(Plane(origin=(4.89, 27.5, 45.04059747), x_dir=(0, 1, 0), z_dir=(0, 0, -1))) as chamfer4_piece_1_section:
        Polygon((CHAMFER4_SIZE, 0), (0, CHAMFER4_SIZE), (0, 0), align=None)
    chamfer4_piece_1 = extrude(amount=15.35841494, mode=Mode.PRIVATE)
    chamfer4_piece_1 = split(chamfer4_piece_1, bisect_by=Plane(origin=(7, 27.5, 45.04059747), z_dir=(-1, 0, 0)), keep=Keep.TOP, mode=Mode.PRIVATE)
    chamfer4_piece_1 = split(chamfer4_piece_1, bisect_by=Plane(origin=(4.89, 24.285396265, 41.825993735), z_dir=(0, -0.7071067811865476, -0.7071067811865476)), keep=Keep.TOP, mode=Mode.PRIVATE)
    add(chamfer4_piece_1, mode=Mode.SUBTRACT)
    with BuildSketch(Plane(origin=(7, 27.5, 36.11139), x_dir=(0, 1, 0), z_dir=(-1, 0, 0))) as chamfer4_piece_2:
        Polygon((CHAMFER4_SIZE, 0), (0, -CHAMFER4_SIZE), (0, 0), align=None)
    extrude(amount=8.53920747, mode=Mode.SUBTRACT)

    # Sketch24 → Cut-Extrude12 (cut)
    with BuildSketch(Plane.XZ.offset(-23.5)):
        with Locations((0, 42.11139)):
            Rectangle(SKETCH24_W, SKETCH24_H)
    extrude(amount=-CUT_EXTRUDE12_DEPTH, mode=Mode.SUBTRACT)


solid = part.part
